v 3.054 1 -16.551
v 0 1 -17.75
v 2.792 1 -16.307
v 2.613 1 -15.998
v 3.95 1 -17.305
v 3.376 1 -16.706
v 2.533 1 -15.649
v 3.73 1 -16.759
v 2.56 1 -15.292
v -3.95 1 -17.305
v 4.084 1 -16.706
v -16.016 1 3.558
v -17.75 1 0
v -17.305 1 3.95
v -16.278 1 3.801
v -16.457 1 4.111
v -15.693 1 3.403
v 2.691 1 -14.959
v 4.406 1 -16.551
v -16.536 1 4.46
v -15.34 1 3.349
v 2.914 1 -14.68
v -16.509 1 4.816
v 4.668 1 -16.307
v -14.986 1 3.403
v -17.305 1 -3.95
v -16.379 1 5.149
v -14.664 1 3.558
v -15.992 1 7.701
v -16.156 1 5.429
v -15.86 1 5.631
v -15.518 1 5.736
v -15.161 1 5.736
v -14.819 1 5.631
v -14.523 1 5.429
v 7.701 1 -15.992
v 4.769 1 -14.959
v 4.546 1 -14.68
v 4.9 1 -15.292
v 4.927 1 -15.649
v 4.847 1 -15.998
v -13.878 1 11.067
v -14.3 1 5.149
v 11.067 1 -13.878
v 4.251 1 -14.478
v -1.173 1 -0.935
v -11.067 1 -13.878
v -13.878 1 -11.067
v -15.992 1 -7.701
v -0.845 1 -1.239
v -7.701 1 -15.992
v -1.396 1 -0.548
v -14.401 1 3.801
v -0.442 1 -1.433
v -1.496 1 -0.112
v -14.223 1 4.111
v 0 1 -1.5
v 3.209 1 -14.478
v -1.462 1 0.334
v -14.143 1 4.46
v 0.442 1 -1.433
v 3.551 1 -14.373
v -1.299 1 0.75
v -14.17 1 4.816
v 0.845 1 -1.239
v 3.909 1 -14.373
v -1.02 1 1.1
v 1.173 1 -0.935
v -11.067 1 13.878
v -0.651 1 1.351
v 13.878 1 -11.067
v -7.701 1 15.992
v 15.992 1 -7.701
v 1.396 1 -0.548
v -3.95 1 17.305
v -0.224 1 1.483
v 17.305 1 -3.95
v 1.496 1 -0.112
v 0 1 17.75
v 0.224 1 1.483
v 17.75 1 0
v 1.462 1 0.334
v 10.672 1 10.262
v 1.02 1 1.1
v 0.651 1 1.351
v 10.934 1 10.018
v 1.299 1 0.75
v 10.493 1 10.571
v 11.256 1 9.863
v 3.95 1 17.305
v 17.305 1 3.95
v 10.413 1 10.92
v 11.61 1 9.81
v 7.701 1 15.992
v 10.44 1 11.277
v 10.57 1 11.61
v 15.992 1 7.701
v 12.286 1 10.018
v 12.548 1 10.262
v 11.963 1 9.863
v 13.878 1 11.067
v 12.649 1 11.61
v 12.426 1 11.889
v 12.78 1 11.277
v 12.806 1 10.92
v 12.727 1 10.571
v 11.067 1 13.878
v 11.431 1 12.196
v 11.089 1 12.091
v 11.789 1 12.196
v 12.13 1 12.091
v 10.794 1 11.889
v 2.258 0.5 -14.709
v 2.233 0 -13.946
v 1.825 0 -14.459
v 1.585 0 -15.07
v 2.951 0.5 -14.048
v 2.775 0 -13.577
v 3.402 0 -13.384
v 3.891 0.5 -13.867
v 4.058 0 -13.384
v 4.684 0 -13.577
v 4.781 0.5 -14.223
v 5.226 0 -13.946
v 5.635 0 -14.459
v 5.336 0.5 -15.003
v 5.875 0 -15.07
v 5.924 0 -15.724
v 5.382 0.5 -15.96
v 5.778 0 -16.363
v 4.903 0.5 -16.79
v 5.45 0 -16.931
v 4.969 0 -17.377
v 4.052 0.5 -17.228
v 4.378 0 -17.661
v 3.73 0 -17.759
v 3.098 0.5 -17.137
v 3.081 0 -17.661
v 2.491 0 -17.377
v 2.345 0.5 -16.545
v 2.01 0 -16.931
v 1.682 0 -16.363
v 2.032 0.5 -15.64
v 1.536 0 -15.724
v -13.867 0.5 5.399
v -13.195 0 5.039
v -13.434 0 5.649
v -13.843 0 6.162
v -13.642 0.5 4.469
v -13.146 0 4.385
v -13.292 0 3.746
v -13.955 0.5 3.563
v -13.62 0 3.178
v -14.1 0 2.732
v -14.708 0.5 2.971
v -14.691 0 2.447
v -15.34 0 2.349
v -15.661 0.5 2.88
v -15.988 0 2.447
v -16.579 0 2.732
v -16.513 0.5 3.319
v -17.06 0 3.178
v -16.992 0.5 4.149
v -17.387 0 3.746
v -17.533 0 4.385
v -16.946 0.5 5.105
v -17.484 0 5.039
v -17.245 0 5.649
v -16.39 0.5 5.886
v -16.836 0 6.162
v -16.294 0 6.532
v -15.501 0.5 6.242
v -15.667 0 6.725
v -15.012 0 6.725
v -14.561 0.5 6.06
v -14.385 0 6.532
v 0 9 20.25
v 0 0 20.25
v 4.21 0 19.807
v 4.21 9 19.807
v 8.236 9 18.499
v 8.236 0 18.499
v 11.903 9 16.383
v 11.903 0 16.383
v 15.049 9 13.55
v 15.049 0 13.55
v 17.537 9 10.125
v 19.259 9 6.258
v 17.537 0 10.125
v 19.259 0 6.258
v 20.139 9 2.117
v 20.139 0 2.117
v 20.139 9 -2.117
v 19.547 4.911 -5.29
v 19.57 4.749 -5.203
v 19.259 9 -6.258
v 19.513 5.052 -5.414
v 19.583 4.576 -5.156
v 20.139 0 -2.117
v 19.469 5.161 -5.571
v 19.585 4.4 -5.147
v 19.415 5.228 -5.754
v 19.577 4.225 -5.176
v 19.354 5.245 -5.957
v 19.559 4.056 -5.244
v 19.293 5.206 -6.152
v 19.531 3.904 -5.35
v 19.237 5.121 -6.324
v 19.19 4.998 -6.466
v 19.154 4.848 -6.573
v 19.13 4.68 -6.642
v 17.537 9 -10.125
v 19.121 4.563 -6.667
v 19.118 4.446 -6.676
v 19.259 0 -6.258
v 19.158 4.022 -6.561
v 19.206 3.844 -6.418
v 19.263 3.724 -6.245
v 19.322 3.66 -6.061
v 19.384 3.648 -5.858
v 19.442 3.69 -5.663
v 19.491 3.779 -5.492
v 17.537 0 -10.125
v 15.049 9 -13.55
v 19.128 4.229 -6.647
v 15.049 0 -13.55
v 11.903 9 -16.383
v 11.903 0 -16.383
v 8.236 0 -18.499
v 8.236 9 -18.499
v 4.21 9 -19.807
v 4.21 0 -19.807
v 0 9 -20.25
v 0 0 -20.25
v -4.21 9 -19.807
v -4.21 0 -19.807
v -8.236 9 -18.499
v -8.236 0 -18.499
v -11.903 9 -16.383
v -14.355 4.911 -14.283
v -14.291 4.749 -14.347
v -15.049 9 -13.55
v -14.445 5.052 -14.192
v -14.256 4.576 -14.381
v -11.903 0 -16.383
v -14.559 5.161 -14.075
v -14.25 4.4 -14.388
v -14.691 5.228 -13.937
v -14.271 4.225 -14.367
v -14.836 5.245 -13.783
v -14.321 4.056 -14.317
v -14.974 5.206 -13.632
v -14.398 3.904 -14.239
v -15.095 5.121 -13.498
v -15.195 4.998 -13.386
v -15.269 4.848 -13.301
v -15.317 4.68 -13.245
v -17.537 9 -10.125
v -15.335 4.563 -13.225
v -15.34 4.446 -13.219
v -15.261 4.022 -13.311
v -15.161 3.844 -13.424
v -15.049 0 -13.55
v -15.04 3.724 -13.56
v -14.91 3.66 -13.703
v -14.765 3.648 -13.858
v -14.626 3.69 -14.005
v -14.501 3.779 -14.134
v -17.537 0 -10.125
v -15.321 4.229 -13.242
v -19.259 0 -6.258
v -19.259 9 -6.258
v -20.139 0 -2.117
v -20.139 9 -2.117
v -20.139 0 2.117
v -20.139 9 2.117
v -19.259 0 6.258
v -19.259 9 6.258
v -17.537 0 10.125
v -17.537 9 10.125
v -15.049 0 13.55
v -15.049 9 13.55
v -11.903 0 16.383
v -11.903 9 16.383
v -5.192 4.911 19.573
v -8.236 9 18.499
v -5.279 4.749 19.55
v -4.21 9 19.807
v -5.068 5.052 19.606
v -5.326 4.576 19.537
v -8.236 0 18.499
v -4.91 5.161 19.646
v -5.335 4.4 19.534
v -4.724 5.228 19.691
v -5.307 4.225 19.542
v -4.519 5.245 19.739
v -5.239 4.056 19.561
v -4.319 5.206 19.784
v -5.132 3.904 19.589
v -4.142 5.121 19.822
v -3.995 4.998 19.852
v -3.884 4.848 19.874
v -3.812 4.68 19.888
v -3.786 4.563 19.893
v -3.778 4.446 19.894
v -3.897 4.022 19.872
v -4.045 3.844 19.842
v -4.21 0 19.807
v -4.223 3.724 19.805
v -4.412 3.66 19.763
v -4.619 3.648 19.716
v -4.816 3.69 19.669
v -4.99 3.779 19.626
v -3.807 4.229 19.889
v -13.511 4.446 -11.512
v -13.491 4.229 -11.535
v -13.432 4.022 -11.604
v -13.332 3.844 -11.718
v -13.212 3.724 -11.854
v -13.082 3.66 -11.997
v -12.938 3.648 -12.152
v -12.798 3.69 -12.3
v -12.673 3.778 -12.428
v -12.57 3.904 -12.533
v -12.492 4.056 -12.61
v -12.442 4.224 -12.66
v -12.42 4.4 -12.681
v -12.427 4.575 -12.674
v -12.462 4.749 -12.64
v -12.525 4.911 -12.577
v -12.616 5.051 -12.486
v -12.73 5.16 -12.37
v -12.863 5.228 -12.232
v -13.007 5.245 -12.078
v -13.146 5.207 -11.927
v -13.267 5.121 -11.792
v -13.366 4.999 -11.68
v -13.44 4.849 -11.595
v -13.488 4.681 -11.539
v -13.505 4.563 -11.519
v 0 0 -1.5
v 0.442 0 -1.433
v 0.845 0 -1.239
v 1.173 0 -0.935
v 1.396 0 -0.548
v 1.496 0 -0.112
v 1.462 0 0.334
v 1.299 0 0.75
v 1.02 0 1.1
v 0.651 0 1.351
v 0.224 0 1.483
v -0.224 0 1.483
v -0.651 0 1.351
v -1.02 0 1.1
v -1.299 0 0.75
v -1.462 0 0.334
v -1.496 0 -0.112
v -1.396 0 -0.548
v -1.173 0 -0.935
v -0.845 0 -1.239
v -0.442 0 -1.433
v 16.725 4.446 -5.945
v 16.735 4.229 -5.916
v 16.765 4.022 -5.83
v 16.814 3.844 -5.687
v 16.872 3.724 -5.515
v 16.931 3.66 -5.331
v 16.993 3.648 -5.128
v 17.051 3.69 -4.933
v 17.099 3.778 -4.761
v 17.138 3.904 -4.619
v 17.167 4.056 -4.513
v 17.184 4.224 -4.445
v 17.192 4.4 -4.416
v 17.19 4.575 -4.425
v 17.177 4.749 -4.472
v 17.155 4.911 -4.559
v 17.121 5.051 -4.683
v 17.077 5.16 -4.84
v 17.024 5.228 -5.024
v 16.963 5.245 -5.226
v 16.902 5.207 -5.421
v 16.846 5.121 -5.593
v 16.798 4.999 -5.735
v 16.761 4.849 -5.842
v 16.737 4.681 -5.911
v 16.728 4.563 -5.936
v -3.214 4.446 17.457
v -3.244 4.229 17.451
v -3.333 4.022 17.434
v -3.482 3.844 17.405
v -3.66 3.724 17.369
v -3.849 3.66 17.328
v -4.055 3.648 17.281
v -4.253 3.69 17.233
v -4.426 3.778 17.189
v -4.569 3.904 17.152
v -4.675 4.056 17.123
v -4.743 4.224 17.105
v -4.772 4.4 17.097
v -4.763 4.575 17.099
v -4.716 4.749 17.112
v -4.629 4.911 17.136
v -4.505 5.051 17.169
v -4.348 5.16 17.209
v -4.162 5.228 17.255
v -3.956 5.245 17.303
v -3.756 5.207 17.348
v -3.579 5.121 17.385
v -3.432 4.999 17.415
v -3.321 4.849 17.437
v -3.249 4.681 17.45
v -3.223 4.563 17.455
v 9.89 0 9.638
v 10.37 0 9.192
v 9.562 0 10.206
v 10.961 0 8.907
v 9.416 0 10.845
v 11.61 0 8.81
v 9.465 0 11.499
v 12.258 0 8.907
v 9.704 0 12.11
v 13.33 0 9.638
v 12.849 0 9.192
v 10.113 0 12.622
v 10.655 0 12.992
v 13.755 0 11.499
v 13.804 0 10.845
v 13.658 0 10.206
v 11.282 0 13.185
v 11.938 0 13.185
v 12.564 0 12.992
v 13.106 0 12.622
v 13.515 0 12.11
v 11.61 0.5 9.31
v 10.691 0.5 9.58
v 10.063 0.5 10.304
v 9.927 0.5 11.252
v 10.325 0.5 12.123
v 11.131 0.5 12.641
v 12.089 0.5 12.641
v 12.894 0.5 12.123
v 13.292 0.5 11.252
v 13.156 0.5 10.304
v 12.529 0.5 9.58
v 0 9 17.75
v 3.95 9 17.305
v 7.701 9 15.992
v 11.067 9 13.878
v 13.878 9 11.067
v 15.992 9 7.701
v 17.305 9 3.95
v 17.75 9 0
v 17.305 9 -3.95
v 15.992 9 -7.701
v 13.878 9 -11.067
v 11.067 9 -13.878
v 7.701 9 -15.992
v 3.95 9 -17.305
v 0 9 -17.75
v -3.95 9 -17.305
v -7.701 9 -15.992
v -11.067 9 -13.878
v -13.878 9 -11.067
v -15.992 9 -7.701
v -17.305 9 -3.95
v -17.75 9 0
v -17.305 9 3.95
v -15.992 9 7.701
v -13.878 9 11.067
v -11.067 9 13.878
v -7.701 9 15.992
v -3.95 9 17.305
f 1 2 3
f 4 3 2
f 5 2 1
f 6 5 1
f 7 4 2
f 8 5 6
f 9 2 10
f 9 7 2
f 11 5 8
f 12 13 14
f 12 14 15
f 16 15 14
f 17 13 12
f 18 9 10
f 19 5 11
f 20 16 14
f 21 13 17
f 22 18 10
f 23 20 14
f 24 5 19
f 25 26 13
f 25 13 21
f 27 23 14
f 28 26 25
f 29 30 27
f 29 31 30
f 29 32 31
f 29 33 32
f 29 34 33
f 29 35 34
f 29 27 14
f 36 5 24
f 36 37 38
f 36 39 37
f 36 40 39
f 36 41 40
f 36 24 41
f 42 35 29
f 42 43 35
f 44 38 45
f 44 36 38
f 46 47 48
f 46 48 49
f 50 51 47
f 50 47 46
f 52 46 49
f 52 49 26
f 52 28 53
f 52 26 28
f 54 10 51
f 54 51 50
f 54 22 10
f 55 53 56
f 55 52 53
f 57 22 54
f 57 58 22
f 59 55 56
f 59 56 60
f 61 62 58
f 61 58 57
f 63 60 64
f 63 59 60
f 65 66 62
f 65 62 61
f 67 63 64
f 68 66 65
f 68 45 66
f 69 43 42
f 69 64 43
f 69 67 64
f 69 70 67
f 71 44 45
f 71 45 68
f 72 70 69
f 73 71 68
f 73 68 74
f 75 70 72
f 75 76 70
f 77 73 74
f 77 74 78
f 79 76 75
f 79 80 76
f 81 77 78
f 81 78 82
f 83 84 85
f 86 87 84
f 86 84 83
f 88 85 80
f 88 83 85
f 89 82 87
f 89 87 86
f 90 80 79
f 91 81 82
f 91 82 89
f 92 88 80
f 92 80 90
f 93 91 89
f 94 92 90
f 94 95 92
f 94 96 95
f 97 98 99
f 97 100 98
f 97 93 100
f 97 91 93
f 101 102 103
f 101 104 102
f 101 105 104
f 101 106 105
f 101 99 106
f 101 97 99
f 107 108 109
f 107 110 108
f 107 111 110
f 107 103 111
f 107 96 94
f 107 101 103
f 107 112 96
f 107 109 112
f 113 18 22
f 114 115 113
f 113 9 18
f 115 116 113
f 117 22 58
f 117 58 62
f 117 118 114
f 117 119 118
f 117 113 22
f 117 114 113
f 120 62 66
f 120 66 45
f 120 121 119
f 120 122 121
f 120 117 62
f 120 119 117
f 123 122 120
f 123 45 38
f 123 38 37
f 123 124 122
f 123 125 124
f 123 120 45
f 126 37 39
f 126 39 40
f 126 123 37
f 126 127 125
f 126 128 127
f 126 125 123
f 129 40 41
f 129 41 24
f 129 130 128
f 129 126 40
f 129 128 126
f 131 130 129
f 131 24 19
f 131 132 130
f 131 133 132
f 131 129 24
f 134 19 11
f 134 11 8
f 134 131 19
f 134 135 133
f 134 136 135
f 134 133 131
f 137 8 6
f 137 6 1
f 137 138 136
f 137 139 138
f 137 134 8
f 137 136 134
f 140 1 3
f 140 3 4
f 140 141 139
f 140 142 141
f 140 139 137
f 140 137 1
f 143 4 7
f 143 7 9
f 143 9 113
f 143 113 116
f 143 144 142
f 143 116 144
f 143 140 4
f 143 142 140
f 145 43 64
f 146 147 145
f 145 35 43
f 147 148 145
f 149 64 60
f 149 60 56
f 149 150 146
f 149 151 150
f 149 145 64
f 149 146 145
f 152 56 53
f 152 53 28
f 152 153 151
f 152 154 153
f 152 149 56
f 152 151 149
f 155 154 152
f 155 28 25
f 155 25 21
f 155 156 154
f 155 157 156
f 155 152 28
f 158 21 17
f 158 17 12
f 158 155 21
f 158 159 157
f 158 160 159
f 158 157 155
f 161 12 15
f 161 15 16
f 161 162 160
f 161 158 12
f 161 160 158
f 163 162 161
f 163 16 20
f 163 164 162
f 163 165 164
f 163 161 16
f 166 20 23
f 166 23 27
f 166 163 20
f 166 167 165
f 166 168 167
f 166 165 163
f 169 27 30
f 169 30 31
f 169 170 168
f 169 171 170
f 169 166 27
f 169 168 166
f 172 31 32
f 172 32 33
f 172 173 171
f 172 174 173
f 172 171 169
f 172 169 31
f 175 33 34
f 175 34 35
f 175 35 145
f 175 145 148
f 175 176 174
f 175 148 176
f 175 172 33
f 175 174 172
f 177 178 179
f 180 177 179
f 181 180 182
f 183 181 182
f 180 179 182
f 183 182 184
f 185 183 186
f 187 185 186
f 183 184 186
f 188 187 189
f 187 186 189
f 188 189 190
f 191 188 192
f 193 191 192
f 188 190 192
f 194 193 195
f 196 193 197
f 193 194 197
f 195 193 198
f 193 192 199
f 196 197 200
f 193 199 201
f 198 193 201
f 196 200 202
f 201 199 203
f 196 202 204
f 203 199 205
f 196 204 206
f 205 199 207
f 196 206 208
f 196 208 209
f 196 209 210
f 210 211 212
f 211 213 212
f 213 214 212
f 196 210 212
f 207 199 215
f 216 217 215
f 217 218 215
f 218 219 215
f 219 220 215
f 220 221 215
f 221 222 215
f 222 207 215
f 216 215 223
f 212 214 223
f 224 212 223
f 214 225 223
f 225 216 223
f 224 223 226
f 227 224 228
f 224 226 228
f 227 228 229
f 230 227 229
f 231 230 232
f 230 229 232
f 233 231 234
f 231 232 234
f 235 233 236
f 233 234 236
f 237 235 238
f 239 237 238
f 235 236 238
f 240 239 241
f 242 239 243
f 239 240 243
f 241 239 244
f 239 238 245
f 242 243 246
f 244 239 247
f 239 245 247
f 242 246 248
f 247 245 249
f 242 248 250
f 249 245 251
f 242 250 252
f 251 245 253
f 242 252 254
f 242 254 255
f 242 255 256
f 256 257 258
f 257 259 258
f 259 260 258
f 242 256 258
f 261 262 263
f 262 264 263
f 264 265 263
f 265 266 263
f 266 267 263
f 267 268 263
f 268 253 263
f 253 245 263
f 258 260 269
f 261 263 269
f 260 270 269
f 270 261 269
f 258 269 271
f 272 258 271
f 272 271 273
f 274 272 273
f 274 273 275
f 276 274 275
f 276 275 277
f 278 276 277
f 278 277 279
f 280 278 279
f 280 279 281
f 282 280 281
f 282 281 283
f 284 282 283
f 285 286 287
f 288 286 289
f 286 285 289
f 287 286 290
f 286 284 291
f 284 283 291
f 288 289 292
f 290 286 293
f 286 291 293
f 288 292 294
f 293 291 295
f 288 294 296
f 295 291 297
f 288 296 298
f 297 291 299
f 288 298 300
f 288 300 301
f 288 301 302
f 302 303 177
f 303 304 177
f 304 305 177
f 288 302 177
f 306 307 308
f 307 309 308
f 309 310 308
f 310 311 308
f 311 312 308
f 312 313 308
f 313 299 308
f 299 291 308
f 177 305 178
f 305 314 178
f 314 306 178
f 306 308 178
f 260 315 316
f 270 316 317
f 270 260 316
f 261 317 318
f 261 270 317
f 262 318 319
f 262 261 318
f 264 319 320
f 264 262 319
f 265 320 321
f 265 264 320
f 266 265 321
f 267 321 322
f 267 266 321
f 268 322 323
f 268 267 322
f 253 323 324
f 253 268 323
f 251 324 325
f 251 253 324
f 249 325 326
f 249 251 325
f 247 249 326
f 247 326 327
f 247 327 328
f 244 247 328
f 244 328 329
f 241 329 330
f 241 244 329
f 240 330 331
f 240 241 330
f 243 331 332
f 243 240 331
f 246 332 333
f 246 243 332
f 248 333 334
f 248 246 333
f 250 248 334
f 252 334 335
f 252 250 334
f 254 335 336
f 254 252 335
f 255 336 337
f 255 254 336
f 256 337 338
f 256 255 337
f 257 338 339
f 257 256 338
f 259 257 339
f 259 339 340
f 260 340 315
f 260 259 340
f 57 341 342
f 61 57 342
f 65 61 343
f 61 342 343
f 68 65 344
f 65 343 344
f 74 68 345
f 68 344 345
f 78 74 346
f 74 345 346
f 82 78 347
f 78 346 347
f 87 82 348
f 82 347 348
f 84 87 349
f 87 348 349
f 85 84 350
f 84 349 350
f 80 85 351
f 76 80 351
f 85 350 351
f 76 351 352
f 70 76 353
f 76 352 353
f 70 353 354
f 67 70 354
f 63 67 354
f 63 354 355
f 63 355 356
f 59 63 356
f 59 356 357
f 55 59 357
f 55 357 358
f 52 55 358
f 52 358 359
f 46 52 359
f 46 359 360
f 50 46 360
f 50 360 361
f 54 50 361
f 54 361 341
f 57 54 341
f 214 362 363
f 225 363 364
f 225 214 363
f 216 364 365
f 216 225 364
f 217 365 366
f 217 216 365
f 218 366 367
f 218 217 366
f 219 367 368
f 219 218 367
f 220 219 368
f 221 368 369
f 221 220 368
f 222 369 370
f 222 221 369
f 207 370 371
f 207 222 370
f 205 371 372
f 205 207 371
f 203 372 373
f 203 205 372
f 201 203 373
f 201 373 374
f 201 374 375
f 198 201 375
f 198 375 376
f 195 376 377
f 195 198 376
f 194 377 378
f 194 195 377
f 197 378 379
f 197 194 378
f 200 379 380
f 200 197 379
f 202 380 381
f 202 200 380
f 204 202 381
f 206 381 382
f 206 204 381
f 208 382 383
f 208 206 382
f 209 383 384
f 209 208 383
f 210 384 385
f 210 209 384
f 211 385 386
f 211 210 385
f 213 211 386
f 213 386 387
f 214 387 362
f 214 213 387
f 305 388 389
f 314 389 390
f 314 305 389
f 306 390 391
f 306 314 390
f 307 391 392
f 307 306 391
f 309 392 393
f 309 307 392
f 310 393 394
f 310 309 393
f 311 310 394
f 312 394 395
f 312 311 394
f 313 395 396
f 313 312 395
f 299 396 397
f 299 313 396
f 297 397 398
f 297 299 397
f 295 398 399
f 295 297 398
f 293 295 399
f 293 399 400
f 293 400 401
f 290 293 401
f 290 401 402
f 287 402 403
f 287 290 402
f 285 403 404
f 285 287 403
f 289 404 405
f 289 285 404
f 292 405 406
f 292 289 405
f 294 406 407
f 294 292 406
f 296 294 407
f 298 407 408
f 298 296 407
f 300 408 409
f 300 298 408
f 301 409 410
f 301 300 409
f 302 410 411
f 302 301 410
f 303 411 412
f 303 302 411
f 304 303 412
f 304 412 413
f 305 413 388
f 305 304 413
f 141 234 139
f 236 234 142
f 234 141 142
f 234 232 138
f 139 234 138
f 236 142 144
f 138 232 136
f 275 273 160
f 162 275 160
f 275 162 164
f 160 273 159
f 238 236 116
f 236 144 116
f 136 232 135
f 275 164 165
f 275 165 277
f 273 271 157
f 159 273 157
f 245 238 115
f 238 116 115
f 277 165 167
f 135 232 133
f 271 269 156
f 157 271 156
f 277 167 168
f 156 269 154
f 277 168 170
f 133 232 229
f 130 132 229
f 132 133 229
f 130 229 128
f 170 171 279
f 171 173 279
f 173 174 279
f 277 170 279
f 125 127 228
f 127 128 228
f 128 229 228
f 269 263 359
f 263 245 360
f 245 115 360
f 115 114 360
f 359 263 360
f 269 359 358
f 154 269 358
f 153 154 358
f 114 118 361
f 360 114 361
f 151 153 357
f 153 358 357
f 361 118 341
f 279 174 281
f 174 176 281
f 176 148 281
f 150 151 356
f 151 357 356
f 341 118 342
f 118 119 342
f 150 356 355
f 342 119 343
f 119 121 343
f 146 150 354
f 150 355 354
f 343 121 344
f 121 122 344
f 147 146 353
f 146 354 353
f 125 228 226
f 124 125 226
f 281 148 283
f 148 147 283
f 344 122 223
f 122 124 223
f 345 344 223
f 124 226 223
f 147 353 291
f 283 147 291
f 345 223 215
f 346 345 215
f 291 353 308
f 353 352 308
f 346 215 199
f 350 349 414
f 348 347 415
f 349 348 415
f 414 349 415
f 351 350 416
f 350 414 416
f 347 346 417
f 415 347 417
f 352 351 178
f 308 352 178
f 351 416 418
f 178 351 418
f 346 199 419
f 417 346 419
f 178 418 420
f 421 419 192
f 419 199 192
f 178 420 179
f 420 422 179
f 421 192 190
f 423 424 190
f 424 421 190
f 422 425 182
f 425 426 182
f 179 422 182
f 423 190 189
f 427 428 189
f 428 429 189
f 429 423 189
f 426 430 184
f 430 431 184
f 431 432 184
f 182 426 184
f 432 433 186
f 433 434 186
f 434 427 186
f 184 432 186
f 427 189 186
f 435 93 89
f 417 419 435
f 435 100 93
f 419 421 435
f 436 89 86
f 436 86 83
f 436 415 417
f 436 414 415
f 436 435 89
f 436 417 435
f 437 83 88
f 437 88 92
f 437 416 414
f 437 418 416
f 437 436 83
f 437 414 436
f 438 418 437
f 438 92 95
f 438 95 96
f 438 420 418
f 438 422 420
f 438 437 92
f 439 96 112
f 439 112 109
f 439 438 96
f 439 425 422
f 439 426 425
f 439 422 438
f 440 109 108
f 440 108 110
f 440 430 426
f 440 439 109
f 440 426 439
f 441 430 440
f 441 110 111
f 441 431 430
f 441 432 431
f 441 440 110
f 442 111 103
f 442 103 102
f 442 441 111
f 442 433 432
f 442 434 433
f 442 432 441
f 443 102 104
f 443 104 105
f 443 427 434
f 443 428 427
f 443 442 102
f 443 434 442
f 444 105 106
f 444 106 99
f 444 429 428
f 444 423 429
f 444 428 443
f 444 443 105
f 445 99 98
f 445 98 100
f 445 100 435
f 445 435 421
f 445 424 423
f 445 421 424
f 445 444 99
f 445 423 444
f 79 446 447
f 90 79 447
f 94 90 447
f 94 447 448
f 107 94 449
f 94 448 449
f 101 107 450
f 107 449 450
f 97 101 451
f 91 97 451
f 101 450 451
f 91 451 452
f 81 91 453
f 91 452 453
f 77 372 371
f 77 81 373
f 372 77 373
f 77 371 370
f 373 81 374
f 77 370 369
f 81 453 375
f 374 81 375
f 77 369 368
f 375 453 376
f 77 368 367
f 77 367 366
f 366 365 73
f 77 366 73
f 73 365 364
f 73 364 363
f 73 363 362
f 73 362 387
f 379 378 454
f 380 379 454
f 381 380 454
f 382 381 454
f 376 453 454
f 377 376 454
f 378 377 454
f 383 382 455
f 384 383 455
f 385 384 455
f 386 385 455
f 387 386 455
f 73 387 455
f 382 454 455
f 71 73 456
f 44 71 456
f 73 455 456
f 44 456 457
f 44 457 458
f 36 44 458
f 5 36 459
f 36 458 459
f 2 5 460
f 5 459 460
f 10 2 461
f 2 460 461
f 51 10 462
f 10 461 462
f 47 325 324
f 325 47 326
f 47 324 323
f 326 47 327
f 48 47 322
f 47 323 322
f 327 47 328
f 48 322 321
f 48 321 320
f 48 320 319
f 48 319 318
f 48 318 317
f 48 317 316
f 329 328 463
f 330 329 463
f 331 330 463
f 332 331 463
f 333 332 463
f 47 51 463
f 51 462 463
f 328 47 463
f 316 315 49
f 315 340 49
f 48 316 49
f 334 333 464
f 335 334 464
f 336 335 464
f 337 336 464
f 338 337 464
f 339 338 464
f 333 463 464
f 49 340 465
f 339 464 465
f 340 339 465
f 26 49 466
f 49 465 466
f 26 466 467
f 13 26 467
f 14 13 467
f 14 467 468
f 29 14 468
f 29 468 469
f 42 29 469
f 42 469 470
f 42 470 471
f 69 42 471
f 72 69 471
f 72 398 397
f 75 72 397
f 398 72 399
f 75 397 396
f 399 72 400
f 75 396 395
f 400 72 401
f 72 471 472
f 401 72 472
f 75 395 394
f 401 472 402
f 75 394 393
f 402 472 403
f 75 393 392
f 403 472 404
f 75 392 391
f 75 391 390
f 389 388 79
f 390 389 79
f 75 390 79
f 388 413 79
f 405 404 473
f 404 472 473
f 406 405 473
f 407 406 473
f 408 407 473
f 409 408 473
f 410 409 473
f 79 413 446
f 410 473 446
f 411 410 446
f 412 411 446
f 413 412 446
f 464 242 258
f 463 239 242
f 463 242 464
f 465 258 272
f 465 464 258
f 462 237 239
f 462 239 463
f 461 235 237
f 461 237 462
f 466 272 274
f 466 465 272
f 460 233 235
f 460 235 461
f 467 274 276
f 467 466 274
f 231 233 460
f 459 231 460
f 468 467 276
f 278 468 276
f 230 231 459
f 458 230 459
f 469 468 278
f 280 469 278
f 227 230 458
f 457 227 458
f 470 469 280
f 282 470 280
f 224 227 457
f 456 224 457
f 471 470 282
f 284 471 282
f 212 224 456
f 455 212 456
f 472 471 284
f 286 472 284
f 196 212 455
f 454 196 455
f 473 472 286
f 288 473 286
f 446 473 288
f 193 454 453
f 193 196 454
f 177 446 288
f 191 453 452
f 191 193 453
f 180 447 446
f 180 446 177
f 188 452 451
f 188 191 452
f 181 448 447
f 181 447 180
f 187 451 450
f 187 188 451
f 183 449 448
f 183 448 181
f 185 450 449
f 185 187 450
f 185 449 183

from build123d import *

# Parameters (mm, degrees)
SKETCH1_R           = 20.25
BOSS_EXTRUDE1_DEPTH = 9
SKETCH2_R           = 17.75
CUT_EXTRUDE1_DEPTH  = 8
CIRPATTERN1_COUNT   = 3
SKETCH5_R           = 1.5
CUT_EXTRUDE2_DEPTH  = 8
CIRPATTERN2_COUNT   = 3


with BuildPart() as part:
    # Sketch1 → Boss-Extrude1 (new body)
    with BuildSketch(Plane(origin=(0, 0, 0), x_dir=(1, 0, 0), z_dir=(0, 1, 0))):
        with Locations(Location((0, 0, 0), (0, 0, 270))):
            Circle(SKETCH1_R)
    extrude(amount=BOSS_EXTRUDE1_DEPTH)

    # Sketch2 → Cut-Extrude1 (cut)
    with BuildSketch(Plane(origin=(0, 9, 0), x_dir=(1, 0, 0), z_dir=(0, 1, 0))):
        with Locations(Location((0, 0, 0), (0, 0, 270))):
            Circle(SKETCH2_R)
    extrude(amount=-CUT_EXTRUDE1_DEPTH, mode=Mode.SUBTRACT)

    # Sketch4 → CSK SLOT for M2 Countersunk Flat Head Screw1 (revolve, cut)
    with BuildSketch(Plane(origin=(11.609715894, 0, 11.00974554), x_dir=(0, 0, -1), z_dir=(1, 0, 0))):
        Polygon((0, 0), (0, 6.521032743), (1.2, 5.8), (1.2, 1), (2.2, 0), align=None)
    csk_slot_for_m2_countersunk_flat_head_sc = revolve(axis=Axis((11.609715894, -6.35, 11.00974554), (0, 1, 0)), mode=Mode.SUBTRACT)

    # CirPattern1: CSK SLOT for M2 Countersunk Flat Head Screw1 ×3 about axis
    cirpattern1_axis = Axis((0, 0, 0), (0, 1, 0))
    for i in range(1, CIRPATTERN1_COUNT):
        add(csk_slot_for_m2_countersunk_flat_head_sc.rotate(cirpattern1_axis, i * 360 / CIRPATTERN1_COUNT), mode=Mode.SUBTRACT)

    # Sketch5 → Cut-Extrude2 (cut)
    with BuildSketch(Plane.XZ):
        with Locations(Location((0, 0, 0), (0, 0, 270))):
            Circle(SKETCH5_R)
    extrude(amount=-CUT_EXTRUDE2_DEPTH, mode=Mode.SUBTRACT)

    # Sketch6 → M2 Tapped Hole1 (revolve, cut)
    with BuildSketch(Plane(origin=(-4.560794248, 4.445790719, 19.729715047), x_dir=(0.974306915892993, 0, 0.22522440729877435), z_dir=(0, 1, 0))):
        Polygon((0, 0), (0, 4.980688495), (0.8, 4.5), (0.8, 0), align=None)
    m2_tapped_hole1 = revolve(axis=Axis((-5.990969234, 4.445790719, 25.916563963), (0.22522440729877433, 0, -0.9743069158929931)), mode=Mode.SUBTRACT)

    # CirPattern2: M2 Tapped Hole1 ×3 about axis
    cirpattern2_axis = Axis((0, 9, 0), (0, -1, 0))
    for i in range(1, CIRPATTERN2_COUNT):
        add(m2_tapped_hole1.rotate(cirpattern2_axis, i * 360 / CIRPATTERN2_COUNT), mode=Mode.SUBTRACT)


solid = part.part
